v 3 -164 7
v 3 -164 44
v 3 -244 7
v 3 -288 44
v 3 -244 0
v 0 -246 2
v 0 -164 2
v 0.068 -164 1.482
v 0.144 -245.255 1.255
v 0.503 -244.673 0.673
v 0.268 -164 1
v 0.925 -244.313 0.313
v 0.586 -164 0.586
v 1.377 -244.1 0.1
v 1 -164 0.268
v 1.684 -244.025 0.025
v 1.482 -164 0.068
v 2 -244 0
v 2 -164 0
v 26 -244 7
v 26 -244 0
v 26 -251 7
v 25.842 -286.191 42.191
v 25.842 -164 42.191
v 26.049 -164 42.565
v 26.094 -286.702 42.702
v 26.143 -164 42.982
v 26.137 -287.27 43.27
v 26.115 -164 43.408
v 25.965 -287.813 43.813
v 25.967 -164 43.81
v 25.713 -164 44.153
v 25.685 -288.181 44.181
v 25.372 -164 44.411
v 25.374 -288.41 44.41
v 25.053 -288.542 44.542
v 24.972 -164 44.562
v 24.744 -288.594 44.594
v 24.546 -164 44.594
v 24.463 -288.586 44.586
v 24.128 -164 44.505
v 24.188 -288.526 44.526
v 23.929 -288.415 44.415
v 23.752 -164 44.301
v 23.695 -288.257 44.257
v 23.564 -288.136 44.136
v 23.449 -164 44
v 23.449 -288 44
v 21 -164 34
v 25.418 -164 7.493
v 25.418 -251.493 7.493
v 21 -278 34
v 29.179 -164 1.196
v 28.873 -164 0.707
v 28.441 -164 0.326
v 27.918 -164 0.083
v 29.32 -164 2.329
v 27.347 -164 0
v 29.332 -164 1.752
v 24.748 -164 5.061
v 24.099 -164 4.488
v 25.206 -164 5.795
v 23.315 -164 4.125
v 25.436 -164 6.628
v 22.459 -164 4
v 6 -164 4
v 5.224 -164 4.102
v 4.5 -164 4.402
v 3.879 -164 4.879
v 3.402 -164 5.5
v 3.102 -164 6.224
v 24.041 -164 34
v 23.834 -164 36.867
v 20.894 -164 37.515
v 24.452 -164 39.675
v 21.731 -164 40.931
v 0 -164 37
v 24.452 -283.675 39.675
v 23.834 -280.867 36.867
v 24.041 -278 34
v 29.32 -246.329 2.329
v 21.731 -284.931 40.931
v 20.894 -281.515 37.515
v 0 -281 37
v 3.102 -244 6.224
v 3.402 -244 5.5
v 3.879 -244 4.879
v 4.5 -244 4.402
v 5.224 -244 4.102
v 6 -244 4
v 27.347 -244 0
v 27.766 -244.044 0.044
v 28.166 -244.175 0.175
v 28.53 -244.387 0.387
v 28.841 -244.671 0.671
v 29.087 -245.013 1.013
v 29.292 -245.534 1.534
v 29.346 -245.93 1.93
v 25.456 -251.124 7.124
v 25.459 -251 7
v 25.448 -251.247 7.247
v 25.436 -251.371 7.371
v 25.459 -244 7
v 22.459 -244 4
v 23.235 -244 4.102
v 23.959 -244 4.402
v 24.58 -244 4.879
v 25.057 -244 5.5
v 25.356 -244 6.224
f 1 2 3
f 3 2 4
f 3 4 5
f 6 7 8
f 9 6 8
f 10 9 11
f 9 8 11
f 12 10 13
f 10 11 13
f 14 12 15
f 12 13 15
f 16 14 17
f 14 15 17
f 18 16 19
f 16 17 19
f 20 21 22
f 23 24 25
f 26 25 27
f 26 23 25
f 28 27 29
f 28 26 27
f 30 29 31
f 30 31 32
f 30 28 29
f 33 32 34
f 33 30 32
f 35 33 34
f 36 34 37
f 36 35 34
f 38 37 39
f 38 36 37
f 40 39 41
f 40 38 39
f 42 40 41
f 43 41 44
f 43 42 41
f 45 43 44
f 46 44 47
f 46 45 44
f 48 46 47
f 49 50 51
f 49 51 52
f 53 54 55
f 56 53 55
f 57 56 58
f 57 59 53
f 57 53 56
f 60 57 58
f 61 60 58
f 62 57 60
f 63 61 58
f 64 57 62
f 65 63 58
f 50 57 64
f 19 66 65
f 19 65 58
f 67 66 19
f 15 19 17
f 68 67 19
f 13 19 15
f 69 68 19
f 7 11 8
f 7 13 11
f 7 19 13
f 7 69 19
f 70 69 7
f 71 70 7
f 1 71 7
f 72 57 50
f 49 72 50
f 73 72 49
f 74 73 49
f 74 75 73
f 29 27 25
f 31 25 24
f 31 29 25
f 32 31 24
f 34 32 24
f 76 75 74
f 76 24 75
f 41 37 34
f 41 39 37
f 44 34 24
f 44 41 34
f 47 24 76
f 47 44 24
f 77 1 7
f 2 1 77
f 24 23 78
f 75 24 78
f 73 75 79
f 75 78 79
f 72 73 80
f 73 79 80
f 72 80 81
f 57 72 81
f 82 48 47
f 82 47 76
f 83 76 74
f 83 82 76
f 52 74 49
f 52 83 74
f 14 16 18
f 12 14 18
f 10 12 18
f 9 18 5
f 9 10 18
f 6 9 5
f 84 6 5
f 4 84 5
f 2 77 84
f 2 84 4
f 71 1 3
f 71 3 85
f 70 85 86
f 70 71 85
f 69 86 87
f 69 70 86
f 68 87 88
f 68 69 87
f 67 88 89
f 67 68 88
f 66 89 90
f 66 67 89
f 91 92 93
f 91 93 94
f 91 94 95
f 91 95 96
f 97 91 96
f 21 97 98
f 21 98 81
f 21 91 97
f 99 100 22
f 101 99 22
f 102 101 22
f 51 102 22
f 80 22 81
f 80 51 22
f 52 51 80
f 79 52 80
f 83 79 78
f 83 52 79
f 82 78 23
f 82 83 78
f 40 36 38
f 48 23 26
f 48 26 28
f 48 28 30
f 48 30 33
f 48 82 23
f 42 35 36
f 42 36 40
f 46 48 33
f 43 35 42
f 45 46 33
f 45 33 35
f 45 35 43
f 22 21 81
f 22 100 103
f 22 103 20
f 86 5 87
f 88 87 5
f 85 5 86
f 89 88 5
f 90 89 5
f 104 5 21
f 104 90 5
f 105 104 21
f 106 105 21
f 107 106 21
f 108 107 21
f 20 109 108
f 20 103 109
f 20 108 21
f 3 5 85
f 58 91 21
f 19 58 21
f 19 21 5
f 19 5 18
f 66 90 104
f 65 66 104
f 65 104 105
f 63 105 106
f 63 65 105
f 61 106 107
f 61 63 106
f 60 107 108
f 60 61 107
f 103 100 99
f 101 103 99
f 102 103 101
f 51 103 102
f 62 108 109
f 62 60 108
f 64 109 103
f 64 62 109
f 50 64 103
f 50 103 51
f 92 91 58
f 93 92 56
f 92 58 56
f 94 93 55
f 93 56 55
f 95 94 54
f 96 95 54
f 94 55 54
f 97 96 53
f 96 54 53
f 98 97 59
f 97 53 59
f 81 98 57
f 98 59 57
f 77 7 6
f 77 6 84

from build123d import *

# Parameters (mm, degrees)
PAD_DEPTH       = 129
FILLET_R        = 3
FILLET001_R     = 2
POCKET_DEPTH    = 29.348127
SKETCH002_W     = 23
SKETCH002_H     = 7
POCKET001_DEPTH = 49


with BuildPart() as k_rper:
    # Sketch → Pad (new body)
    with BuildSketch(Plane.XZ):
        with BuildLine():
            Line((0, 0), (0, 37))
            Line((0, 37), (3, 44))
            Line((3, 44), (3, 4))
            Line((3, 4), (26, 4))
            Line((26, 4), (21, 34))
            ThreePointArc((23.448856, 44), (21.197055, 39.251589), (21, 34))
            ThreePointArc((25.84203, 42.190943), (25.551614, 44.294231), (23.448856, 44))
            ThreePointArc((25.84203, 42.190943), (24.041555, 38.293355), (24.041381, 34))
            Line((24.041381, 34), (29.708048, 0))
            Line((29.708048, 0), (0, 0))
        make_face()
    extrude(amount=PAD_DEPTH)

    # Fillet
    fillet_edges = [k_rper.edges().sort_by_distance(p)[0] for p in [
        (26, -64.5, 4),
        (3, -64.5, 4),
    ]]
    fillet(fillet_edges, radius=FILLET_R)

    # Fillet001
    fillet001_edges = [k_rper.edges().sort_by_distance(p)[0] for p in [
        (0, -64.5, 0),
        (29.708048, -64.5, 0),
    ]]
    fillet(fillet001_edges, radius=FILLET001_R)

    # Sketch001 (on Face2 of Fillet001) → Pocket (cut, through all)
    with BuildSketch(Plane(origin=(0, 0, 0), x_dir=(0, 0, -1), z_dir=(-1, 0, 0))):
        Polygon((0, 49), (-45, 4), (-45, 0), (0, 0), align=None)
    extrude(amount=-POCKET_DEPTH, mode=Mode.SUBTRACT)

    # Sketch002 → Pocket001 (cut)
    with BuildSketch(Plane.XZ):
        with Locations((14.5, 3.5)):
            Rectangle(SKETCH002_W, SKETCH002_H)
    extrude(amount=POCKET001_DEPTH, mode=Mode.SUBTRACT)


with BuildPart() as part_mirroring:
    # Part__Mirroring: instance of Körper
    add(k_rper.part.mirror(Plane(origin=(0, -129, 2), x_dir=(1, 0, 0), z_dir=(0, 1, 0))))


with BuildPart() as part_mirroring_1:
    # Part__Mirroring placement: moved
    add(part_mirroring.part.moved(Location((0, -35, 0))))


solid = part_mirroring_1.part
